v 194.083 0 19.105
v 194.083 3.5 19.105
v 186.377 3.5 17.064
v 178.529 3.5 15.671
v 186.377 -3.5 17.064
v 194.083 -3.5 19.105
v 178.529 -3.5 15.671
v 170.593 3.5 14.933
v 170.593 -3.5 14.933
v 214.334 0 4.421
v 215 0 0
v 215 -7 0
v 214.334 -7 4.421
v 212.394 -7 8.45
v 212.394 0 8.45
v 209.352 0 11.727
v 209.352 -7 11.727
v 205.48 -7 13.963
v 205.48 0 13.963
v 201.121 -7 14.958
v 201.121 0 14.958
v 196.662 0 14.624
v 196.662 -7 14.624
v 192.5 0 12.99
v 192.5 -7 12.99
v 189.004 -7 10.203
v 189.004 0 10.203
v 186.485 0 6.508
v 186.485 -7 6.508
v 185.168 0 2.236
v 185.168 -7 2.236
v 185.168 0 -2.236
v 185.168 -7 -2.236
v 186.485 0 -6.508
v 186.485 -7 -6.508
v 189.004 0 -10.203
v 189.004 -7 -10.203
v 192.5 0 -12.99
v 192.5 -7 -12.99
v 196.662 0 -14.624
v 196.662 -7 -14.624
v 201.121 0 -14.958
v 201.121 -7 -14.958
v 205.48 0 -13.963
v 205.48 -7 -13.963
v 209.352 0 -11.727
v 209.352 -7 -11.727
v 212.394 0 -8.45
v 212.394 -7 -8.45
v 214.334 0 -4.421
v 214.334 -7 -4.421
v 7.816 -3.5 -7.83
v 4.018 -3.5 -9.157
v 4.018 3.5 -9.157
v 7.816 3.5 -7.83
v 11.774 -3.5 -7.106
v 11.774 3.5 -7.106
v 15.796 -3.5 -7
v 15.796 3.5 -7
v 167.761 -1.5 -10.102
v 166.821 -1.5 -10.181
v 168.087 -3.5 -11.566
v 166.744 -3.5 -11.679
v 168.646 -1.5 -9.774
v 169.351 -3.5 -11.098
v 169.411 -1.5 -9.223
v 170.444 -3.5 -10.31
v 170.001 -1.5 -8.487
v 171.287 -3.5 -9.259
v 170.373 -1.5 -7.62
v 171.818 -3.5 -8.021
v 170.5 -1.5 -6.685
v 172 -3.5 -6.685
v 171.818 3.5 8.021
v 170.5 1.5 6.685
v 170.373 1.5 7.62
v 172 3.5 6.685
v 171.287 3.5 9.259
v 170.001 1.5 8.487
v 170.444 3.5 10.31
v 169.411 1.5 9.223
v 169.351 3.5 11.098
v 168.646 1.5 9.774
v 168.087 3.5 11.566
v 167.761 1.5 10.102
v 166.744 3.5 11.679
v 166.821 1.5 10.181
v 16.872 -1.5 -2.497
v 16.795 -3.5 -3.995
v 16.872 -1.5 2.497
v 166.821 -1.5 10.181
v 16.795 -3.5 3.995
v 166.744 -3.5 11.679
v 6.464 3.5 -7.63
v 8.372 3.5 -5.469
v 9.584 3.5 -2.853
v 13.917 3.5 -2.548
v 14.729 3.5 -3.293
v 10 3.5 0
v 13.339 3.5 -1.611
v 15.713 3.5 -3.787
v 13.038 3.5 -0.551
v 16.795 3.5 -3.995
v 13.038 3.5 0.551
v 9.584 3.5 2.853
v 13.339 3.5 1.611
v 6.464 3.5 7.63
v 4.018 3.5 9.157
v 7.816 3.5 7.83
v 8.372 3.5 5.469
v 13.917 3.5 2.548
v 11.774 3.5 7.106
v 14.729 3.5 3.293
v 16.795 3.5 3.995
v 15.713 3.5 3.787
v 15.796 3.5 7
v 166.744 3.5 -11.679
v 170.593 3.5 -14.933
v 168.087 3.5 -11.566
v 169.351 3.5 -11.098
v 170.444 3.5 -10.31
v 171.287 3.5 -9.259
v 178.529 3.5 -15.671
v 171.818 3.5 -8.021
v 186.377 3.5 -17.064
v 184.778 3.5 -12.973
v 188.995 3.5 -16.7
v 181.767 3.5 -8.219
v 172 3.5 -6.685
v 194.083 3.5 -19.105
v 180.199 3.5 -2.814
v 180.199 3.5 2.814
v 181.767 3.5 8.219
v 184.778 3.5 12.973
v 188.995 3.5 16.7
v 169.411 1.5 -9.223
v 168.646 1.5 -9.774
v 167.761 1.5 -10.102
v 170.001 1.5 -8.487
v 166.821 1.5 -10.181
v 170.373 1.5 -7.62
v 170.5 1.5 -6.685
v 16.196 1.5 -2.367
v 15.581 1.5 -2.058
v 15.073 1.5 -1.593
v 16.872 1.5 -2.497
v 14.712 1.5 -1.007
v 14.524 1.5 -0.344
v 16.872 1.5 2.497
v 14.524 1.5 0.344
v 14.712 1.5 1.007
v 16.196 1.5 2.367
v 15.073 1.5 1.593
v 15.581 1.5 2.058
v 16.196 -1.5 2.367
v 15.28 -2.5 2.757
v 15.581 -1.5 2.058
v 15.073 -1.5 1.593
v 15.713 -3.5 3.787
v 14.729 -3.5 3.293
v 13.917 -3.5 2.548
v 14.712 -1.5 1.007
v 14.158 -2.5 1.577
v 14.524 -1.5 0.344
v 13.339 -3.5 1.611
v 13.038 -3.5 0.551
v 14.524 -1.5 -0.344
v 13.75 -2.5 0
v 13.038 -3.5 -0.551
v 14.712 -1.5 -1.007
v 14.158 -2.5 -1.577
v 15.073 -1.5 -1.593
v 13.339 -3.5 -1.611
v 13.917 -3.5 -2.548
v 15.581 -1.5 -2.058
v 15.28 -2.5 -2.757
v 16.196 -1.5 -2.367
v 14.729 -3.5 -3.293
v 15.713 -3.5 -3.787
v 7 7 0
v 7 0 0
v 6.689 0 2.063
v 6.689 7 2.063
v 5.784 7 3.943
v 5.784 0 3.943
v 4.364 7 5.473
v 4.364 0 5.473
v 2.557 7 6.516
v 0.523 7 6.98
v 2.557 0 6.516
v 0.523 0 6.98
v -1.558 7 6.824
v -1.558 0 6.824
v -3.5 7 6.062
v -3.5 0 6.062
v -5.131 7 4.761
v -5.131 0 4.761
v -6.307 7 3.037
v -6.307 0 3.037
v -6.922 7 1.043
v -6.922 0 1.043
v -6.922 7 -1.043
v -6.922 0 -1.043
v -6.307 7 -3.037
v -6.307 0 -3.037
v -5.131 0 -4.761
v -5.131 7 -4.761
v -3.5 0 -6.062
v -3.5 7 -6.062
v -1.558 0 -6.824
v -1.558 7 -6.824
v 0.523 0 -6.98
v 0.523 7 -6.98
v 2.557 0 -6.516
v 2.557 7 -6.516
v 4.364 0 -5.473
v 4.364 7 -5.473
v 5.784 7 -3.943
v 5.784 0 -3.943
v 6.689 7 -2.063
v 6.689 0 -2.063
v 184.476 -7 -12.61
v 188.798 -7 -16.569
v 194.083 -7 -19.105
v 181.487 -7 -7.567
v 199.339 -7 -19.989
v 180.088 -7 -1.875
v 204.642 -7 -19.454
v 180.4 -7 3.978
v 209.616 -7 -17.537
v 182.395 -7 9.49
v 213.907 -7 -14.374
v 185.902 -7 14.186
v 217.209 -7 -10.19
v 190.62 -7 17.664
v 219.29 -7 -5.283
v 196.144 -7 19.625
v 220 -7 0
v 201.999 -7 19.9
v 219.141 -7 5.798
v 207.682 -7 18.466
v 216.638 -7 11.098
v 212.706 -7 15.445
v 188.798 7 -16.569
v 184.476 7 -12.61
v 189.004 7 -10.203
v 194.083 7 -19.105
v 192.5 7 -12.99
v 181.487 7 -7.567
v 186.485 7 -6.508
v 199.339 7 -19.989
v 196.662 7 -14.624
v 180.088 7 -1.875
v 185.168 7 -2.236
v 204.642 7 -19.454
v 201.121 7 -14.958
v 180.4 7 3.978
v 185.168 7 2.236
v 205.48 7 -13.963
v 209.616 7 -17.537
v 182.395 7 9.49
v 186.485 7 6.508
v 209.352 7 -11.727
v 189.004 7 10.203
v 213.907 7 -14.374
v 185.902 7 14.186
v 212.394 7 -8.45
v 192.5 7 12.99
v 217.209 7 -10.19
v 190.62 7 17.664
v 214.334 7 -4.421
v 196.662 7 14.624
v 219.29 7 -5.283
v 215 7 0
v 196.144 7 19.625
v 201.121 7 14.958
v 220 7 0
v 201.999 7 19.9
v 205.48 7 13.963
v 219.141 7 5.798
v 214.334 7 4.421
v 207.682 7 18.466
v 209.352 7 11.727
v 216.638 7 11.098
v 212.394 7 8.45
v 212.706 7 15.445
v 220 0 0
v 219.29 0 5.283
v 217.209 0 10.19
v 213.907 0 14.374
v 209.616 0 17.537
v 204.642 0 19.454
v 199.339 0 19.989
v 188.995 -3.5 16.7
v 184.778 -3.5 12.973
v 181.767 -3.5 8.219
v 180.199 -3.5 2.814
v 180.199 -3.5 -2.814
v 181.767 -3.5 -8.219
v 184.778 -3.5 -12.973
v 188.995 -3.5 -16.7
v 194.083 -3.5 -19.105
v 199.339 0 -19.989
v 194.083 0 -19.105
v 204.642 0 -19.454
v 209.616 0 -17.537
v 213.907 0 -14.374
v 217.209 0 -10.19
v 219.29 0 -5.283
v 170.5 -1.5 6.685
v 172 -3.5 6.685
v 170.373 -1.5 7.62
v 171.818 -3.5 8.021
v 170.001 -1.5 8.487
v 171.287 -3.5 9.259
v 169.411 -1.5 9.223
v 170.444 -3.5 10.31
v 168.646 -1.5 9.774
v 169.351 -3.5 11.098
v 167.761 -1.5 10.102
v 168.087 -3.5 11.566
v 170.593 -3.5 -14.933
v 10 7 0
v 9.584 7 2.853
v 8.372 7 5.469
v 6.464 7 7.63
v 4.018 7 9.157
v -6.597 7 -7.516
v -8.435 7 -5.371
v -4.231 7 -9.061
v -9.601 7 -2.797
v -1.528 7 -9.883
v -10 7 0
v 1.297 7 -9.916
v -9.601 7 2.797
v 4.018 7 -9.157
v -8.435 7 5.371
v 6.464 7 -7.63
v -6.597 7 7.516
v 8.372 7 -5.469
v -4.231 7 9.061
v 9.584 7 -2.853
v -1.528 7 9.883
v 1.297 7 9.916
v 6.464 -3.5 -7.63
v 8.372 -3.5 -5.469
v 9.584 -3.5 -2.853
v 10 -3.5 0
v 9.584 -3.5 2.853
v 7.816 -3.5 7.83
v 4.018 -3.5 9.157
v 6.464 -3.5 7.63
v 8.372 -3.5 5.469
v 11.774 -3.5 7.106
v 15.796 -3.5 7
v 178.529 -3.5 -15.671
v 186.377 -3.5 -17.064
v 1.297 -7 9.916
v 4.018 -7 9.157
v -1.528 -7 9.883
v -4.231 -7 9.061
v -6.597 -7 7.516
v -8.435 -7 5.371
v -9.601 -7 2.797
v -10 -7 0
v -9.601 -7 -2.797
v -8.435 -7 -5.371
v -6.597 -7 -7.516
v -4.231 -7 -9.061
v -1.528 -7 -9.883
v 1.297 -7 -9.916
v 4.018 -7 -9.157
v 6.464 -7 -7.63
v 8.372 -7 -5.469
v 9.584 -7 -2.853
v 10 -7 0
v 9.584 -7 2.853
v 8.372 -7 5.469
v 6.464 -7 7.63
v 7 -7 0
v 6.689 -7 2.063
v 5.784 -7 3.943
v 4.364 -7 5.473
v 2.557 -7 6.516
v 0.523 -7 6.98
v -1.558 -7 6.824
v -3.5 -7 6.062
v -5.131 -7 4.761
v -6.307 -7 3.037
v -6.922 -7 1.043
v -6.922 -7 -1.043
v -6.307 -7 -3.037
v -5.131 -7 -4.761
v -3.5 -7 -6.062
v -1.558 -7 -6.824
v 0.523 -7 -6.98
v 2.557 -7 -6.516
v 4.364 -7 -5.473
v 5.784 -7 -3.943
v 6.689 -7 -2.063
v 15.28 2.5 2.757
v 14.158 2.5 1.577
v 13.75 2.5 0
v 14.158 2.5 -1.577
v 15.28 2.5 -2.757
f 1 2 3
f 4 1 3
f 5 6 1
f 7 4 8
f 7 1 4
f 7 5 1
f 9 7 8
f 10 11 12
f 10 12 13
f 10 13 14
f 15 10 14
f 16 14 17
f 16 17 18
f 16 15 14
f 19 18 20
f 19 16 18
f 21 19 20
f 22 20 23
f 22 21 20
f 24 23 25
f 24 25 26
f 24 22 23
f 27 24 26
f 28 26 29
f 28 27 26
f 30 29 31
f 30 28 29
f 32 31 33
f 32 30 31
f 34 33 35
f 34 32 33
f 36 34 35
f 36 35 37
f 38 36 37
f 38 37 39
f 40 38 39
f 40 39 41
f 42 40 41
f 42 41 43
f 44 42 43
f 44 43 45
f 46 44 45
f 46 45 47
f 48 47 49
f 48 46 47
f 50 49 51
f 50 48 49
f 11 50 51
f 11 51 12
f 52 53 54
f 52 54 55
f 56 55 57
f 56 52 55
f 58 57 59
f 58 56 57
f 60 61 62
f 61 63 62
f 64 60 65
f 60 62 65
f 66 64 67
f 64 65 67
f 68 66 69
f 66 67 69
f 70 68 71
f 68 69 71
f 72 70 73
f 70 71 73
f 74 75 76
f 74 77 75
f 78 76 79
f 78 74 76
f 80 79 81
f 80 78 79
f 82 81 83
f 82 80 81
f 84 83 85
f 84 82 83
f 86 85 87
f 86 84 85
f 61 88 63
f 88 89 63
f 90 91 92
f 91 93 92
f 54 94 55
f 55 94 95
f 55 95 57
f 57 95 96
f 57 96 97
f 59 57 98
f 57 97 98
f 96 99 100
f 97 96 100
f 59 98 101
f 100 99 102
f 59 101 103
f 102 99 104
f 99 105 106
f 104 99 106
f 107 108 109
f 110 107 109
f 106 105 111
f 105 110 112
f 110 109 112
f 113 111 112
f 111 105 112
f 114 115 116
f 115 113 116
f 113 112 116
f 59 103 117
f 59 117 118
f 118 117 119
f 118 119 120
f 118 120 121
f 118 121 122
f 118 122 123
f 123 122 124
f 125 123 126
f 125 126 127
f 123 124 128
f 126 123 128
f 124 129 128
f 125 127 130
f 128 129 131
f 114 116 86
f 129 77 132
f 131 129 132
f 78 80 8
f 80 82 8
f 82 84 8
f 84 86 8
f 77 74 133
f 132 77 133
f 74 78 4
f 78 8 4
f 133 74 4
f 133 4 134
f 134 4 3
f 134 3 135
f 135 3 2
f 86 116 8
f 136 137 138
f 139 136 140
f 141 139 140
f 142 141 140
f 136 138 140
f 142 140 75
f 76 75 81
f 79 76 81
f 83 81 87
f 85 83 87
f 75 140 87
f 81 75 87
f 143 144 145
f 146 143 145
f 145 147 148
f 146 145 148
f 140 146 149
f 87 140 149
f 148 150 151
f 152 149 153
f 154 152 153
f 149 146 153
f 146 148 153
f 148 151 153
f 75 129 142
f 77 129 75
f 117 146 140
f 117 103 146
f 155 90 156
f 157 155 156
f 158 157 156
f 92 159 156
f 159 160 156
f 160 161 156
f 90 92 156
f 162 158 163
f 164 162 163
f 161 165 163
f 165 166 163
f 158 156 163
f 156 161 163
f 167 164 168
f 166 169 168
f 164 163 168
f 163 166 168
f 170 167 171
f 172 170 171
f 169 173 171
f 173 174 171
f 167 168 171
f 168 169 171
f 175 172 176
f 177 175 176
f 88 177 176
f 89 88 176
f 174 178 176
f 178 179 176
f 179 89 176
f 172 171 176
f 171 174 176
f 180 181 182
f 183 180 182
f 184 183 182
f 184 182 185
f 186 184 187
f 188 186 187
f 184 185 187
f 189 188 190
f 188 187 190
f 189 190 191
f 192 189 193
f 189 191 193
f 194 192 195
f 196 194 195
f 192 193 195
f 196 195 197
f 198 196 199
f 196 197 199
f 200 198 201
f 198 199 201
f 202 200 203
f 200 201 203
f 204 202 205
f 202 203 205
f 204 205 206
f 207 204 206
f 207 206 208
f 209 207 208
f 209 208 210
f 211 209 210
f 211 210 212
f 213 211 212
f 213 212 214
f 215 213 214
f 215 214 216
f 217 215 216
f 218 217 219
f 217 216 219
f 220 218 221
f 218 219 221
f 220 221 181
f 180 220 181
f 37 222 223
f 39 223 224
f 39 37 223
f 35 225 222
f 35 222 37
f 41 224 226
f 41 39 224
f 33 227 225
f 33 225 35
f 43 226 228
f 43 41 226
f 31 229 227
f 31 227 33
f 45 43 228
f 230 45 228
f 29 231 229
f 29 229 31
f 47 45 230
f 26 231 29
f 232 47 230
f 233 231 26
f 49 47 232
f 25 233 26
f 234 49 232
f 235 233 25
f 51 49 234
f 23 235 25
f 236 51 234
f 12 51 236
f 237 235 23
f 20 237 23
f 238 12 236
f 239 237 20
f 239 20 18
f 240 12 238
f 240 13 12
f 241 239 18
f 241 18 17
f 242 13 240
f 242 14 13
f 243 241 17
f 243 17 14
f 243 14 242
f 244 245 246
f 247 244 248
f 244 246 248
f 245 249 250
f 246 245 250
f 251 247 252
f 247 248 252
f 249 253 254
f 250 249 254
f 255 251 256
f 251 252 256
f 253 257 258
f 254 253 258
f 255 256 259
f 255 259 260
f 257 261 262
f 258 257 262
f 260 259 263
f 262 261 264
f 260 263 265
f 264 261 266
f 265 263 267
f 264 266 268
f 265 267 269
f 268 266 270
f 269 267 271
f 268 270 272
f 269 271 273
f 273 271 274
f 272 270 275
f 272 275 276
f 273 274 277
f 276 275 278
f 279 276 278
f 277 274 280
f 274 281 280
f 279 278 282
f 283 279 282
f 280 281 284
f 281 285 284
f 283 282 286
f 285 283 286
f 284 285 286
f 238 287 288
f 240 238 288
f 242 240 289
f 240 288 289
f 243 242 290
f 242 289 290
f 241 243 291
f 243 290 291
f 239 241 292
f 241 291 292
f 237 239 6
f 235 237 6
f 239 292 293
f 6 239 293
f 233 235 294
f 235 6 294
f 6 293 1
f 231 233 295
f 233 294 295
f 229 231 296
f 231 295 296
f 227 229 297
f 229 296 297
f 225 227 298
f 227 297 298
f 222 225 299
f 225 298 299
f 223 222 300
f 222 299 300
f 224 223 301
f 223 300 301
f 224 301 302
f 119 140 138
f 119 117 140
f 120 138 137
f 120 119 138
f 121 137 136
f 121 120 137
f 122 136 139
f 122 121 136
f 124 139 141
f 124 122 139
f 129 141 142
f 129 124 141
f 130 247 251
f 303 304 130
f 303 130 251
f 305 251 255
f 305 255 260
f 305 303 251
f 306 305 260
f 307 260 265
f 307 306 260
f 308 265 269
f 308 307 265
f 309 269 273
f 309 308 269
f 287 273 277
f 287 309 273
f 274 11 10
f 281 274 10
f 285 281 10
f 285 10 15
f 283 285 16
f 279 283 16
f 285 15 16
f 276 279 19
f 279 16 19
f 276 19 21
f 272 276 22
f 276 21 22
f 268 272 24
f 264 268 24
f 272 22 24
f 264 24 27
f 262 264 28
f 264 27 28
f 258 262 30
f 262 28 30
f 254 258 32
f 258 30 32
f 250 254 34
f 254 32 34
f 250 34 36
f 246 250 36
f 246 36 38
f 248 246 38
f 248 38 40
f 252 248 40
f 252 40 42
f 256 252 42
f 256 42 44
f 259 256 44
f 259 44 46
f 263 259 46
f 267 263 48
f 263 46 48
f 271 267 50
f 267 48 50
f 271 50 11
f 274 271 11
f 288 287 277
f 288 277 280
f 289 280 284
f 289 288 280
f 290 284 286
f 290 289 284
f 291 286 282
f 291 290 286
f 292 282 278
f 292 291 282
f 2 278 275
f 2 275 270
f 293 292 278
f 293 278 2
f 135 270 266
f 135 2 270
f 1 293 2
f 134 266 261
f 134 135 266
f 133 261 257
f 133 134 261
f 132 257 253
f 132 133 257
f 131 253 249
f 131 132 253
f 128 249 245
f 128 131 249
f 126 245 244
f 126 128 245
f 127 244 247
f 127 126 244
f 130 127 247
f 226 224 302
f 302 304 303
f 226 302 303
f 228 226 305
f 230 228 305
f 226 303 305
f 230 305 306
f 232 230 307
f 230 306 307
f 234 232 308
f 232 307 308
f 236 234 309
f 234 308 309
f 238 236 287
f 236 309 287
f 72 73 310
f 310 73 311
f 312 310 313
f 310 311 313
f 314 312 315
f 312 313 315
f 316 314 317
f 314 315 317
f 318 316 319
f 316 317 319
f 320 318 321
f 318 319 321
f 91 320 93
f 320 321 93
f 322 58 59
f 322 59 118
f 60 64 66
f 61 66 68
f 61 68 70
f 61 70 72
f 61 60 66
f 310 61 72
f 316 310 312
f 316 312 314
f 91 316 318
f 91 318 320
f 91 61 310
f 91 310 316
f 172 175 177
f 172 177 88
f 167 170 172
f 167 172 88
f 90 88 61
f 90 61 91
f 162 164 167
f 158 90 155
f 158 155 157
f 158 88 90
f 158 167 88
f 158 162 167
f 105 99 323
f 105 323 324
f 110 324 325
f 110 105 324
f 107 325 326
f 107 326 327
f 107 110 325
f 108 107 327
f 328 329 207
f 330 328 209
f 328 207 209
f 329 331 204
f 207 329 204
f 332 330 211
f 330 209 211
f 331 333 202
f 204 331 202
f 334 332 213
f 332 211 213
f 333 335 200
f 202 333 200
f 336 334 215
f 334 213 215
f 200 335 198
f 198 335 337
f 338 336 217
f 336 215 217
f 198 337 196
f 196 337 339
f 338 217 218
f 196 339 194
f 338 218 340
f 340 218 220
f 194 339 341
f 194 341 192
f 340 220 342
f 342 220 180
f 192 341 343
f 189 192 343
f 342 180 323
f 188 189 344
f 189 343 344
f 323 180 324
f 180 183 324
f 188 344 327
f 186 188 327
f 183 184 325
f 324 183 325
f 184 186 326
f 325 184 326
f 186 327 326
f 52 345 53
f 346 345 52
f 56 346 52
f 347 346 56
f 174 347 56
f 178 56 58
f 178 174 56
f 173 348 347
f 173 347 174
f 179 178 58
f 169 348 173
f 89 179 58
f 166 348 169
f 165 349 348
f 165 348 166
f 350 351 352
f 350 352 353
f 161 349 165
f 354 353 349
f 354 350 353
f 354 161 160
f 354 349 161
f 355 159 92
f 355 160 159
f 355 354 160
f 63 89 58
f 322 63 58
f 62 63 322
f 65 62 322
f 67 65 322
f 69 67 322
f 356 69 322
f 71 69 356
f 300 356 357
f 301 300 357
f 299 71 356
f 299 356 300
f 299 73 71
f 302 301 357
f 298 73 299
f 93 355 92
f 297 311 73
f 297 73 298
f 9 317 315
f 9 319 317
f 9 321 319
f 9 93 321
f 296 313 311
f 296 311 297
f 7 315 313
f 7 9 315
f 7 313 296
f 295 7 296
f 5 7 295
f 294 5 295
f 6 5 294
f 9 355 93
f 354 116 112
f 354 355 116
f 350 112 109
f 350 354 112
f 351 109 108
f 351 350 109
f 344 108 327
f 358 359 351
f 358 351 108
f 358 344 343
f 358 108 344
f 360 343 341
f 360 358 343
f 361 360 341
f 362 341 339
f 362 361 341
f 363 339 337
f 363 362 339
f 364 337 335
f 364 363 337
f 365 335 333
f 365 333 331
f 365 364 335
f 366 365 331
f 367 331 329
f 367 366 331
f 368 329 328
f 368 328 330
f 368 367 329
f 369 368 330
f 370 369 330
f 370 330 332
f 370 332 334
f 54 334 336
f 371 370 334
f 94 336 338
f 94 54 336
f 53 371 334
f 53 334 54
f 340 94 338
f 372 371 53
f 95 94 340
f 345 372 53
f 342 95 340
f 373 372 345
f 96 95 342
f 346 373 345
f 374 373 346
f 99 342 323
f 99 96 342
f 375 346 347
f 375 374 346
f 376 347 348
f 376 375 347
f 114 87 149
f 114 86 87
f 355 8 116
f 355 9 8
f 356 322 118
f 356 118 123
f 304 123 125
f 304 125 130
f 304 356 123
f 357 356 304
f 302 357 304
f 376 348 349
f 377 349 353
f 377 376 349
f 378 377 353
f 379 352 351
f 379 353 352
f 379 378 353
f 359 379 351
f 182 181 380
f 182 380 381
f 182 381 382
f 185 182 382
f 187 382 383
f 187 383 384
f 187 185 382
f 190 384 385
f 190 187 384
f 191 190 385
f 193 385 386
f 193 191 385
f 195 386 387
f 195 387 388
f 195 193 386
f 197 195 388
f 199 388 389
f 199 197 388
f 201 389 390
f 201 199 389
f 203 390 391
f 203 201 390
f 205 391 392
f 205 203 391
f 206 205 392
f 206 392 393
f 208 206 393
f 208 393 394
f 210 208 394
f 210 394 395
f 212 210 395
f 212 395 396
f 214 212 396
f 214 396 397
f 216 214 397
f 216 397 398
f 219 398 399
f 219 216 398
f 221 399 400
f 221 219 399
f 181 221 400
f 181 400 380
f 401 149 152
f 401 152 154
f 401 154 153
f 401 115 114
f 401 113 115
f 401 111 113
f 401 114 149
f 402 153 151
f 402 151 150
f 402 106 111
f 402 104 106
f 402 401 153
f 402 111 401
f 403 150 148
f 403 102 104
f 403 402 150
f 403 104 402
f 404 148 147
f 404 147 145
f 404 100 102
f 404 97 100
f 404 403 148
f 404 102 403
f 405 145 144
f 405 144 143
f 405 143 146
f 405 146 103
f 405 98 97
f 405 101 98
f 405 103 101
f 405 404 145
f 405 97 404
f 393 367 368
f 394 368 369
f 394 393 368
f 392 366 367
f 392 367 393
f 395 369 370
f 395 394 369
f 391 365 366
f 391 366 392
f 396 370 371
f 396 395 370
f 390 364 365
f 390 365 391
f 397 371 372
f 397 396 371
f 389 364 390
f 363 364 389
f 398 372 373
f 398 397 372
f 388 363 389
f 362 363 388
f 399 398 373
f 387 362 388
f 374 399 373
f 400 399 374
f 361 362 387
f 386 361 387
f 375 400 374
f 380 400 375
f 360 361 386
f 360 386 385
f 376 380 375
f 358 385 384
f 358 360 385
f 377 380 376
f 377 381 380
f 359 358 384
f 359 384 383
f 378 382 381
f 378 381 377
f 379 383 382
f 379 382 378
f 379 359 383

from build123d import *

# Parameters (mm, degrees)
F2_DEPTH = 3.5
F0_R     = 15
F0_R_2   = 7
F3_DEPTH = 7


# Not quite as in the source:
# - a pattern or mirror of a feature is missing from the dataset's text; its kind, count and spacing are read off the source's solid


with BuildPart() as f2:
    # F0 (on Front) → F2 (new body, symmetric)
    with BuildSketch(Plane.XZ):
        with BuildLine():
            ThreePointArc((4.0181641166, 9.157202473), (8.372026074, 5.4689285438), (10, 0))
            ThreePointArc((10, 0), (8.372026074, -5.4689285438), (4.0181641166, -9.157202473))
            ThreePointArc((4.0181641166, -9.157202473), (9.7812118117, -7.3913621026), (15.7960057944, -7))
            Line((15.7960057944, -7), (170.5928896385, -14.9325123484))
            ThreePointArc((170.5928896385, -14.9325123484), (182.467918995, -16.2860219438), (194.0827327125, -19.1046054094))
            ThreePointArc((194.0827327125, -19.1046054094), (180, 0), (194.0827327125, 19.1046054094))
            ThreePointArc((194.0827327125, 19.1046054094), (182.467918995, 16.2860219438), (170.5928896385, 14.9325123484))
            Line((170.5928896385, 14.9325123484), (15.7960057944, 7))
            ThreePointArc((15.7960057944, 7), (9.7812118117, 7.3913621026), (4.0181641166, 9.157202473))
        make_face()
    extrude(amount=F2_DEPTH, both=True)

    # F0 (on Front) → F3 (join, symmetric)
    with BuildSketch(Plane.XZ):
        with BuildLine():
            ThreePointArc((220, 0), (211.86706902, 16.0988407308), (194.0827327125, 19.1046054094))
            ThreePointArc((194.0827327125, 19.1046054094), (180, 0), (194.0827327125, -19.1046054094))
            ThreePointArc((194.0827327125, -19.1046054094), (211.86706902, -16.0988407308), (220, 0))
        make_face()
        with Locations((200, 0)):
            Circle(F0_R, mode=Mode.SUBTRACT)
        with BuildLine():
            ThreePointArc((4.0181641166, -9.157202473), (8.372026074, -5.4689285438), (10, 0))
            ThreePointArc((10, 0), (8.372026074, 5.4689285438), (4.0181641166, 9.157202473))
            ThreePointArc((4.0181641166, 9.157202473), (-10, 0), (4.0181641166, -9.157202473))
        make_face()
        Circle(F0_R_2, mode=Mode.SUBTRACT)
    extrude(amount=F3_DEPTH, both=True)

    # F5 (on offset) → F6 section 0
    with BuildSketch(Plane.XZ.offset(1.5)):
        with BuildLine():
            Line((166.8208787534, 10.1807990679), (16.8720562524, 2.496723933))
            ThreePointArc((16.8720562524, 2.496723933), (14.5, 0), (16.8720562524, -2.496723933))
            Line((16.8720562524, -2.496723933), (166.8208787534, -10.1807990679))
            ThreePointArc((166.8208787534, -10.1807990679), (169.4107131348, -9.2227980591), (170.5, -6.6853855618))
            Line((170.5, -6.6853855618), (170.5, 6.6853855618))
            ThreePointArc((170.5, 6.6853855618), (169.4107131348, 9.2227980591), (166.8208787534, 10.1807990679))
        make_face()
    # F4 (on face) → F6 section 1
    with BuildSketch(Plane.XZ.offset(3.5)):
        with BuildLine():
            Line((166.7441125049, 11.6788334277), (16.7952900039, 3.9947582928))
            ThreePointArc((16.7952900039, 3.9947582928), (13, 0), (16.7952900039, -3.9947582928))
            Line((16.7952900039, -3.9947582928), (166.7441125049, -11.6788334277))
            ThreePointArc((166.7441125049, -11.6788334277), (170.4438759069, -10.3102605579), (172, -6.6853855618))
            Line((172, -6.6853855618), (172, 6.6853855618))
            ThreePointArc((172, 6.6853855618), (170.4438759069, 10.3102605579), (166.7441125049, 11.6788334277))
        make_face()
    f6 = loft(mode=Mode.SUBTRACT)

    # F6_copies: F6 across plane
    add(f6.mirror(Plane.ZX), mode=Mode.SUBTRACT)


solid = f2.part
